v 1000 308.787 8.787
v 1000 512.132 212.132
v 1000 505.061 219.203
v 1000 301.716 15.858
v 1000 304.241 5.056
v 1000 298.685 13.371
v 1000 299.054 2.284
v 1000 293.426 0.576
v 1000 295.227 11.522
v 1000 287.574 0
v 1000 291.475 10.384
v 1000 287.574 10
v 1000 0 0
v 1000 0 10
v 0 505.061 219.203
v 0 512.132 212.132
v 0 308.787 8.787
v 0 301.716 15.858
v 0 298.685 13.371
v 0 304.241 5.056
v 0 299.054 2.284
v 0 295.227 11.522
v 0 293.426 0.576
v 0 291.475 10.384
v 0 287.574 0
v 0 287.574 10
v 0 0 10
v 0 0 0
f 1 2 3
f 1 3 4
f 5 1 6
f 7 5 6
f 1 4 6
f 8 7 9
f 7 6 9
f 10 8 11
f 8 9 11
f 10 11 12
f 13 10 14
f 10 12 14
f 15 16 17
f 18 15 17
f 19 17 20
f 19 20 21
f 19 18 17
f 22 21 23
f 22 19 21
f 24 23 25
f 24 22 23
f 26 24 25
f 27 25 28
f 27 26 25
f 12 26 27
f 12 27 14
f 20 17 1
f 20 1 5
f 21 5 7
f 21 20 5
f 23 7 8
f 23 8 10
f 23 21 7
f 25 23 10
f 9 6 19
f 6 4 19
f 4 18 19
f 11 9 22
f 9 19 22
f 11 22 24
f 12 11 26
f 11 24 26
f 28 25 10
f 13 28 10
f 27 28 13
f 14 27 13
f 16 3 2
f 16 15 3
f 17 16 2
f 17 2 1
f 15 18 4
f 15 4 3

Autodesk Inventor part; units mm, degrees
ref_plane "YZ Plane" through (0, 0, 0) normal (1, 0, 0) x (0, 1, 0)
ref_plane "XZ Plane" through (0, 0, 0) normal (0, 1, 0) x (-1, 0, 0)
ref_plane "XY Plane" through (0, 0, 0) normal (0, 0, 1) x (1, 0, 0)
sketch "Sketch1" plane through (0, 0, 0) normal (0, 0, 1) x (1, 0, 0)
  line L0 (0, 0) -> (1000, 0)
  line L1 (1000, 0) -> (1000, 300)
  line L2 (1000, 300) -> (0, 300)
  line L3 (0, 300) -> (0, 0)
  dimension "d0" = 1000
  dimension "d1" = 300
extrude "Plate1" add sketch "Sketch1" along normal blind 10
sketch "Sketch2" plane through (0, 292.9289, 7.0711) normal (0, 0.7071068, -0.7071068) x (-1, 0, 0)
  line L0 (-1000, 0) -> (0, 0)
  line L1 (0, 0) -> (0, 300)
  line L2 (0, 300) -> (-1000, 300)
  line L3 (-1000, 300) -> (-1000, 0)
edge flange "Flange1" height 300 angle 45 thickness 10 bend radius 20 thickness toward (0, 0.7071068, -0.7071068) relief tear relief width 10 relief depth 5 edges at (500, 300, 10) wall of the first edge with corners at (1000, 292.9289, 7.0711) (0, 292.9289, 7.0711) (0, 505.061, 219.2031) (1000, 505.061, 219.2031)
bend "Bend1"
corner "Corner1"
equation "\"d2\" = Thickness"
equation "\"d3\" = BendReliefWidth"
equation "\"d4\" = BendReliefDepth"
equation "\"d5\" = MinimumRemnant"
equation "\"d6\" = TransitionRadius"
equation "\"d10\" = CornerReliefSize"
equation "\"d11\" = GapSize"
equation "\"d12\" = JacobiRadiusSize"
equation "\"BendReliefDepth\" = 0.5 * Thickness"
equation "\"Thickness\" = 10"
equation "\"BendReliefWidth\" = 10"
equation "\"MinimumRemnant\" = 20"
equation "\"TransitionRadius\" = 10"
equation "\"CornerReliefSize\" = 40"
equation "\"GapSize\" = 10"
equation "\"JacobiRadiusSize\" = 10"
properties part number "10mm Polycarb Sheet" material "Polycarbonate, Clear"
